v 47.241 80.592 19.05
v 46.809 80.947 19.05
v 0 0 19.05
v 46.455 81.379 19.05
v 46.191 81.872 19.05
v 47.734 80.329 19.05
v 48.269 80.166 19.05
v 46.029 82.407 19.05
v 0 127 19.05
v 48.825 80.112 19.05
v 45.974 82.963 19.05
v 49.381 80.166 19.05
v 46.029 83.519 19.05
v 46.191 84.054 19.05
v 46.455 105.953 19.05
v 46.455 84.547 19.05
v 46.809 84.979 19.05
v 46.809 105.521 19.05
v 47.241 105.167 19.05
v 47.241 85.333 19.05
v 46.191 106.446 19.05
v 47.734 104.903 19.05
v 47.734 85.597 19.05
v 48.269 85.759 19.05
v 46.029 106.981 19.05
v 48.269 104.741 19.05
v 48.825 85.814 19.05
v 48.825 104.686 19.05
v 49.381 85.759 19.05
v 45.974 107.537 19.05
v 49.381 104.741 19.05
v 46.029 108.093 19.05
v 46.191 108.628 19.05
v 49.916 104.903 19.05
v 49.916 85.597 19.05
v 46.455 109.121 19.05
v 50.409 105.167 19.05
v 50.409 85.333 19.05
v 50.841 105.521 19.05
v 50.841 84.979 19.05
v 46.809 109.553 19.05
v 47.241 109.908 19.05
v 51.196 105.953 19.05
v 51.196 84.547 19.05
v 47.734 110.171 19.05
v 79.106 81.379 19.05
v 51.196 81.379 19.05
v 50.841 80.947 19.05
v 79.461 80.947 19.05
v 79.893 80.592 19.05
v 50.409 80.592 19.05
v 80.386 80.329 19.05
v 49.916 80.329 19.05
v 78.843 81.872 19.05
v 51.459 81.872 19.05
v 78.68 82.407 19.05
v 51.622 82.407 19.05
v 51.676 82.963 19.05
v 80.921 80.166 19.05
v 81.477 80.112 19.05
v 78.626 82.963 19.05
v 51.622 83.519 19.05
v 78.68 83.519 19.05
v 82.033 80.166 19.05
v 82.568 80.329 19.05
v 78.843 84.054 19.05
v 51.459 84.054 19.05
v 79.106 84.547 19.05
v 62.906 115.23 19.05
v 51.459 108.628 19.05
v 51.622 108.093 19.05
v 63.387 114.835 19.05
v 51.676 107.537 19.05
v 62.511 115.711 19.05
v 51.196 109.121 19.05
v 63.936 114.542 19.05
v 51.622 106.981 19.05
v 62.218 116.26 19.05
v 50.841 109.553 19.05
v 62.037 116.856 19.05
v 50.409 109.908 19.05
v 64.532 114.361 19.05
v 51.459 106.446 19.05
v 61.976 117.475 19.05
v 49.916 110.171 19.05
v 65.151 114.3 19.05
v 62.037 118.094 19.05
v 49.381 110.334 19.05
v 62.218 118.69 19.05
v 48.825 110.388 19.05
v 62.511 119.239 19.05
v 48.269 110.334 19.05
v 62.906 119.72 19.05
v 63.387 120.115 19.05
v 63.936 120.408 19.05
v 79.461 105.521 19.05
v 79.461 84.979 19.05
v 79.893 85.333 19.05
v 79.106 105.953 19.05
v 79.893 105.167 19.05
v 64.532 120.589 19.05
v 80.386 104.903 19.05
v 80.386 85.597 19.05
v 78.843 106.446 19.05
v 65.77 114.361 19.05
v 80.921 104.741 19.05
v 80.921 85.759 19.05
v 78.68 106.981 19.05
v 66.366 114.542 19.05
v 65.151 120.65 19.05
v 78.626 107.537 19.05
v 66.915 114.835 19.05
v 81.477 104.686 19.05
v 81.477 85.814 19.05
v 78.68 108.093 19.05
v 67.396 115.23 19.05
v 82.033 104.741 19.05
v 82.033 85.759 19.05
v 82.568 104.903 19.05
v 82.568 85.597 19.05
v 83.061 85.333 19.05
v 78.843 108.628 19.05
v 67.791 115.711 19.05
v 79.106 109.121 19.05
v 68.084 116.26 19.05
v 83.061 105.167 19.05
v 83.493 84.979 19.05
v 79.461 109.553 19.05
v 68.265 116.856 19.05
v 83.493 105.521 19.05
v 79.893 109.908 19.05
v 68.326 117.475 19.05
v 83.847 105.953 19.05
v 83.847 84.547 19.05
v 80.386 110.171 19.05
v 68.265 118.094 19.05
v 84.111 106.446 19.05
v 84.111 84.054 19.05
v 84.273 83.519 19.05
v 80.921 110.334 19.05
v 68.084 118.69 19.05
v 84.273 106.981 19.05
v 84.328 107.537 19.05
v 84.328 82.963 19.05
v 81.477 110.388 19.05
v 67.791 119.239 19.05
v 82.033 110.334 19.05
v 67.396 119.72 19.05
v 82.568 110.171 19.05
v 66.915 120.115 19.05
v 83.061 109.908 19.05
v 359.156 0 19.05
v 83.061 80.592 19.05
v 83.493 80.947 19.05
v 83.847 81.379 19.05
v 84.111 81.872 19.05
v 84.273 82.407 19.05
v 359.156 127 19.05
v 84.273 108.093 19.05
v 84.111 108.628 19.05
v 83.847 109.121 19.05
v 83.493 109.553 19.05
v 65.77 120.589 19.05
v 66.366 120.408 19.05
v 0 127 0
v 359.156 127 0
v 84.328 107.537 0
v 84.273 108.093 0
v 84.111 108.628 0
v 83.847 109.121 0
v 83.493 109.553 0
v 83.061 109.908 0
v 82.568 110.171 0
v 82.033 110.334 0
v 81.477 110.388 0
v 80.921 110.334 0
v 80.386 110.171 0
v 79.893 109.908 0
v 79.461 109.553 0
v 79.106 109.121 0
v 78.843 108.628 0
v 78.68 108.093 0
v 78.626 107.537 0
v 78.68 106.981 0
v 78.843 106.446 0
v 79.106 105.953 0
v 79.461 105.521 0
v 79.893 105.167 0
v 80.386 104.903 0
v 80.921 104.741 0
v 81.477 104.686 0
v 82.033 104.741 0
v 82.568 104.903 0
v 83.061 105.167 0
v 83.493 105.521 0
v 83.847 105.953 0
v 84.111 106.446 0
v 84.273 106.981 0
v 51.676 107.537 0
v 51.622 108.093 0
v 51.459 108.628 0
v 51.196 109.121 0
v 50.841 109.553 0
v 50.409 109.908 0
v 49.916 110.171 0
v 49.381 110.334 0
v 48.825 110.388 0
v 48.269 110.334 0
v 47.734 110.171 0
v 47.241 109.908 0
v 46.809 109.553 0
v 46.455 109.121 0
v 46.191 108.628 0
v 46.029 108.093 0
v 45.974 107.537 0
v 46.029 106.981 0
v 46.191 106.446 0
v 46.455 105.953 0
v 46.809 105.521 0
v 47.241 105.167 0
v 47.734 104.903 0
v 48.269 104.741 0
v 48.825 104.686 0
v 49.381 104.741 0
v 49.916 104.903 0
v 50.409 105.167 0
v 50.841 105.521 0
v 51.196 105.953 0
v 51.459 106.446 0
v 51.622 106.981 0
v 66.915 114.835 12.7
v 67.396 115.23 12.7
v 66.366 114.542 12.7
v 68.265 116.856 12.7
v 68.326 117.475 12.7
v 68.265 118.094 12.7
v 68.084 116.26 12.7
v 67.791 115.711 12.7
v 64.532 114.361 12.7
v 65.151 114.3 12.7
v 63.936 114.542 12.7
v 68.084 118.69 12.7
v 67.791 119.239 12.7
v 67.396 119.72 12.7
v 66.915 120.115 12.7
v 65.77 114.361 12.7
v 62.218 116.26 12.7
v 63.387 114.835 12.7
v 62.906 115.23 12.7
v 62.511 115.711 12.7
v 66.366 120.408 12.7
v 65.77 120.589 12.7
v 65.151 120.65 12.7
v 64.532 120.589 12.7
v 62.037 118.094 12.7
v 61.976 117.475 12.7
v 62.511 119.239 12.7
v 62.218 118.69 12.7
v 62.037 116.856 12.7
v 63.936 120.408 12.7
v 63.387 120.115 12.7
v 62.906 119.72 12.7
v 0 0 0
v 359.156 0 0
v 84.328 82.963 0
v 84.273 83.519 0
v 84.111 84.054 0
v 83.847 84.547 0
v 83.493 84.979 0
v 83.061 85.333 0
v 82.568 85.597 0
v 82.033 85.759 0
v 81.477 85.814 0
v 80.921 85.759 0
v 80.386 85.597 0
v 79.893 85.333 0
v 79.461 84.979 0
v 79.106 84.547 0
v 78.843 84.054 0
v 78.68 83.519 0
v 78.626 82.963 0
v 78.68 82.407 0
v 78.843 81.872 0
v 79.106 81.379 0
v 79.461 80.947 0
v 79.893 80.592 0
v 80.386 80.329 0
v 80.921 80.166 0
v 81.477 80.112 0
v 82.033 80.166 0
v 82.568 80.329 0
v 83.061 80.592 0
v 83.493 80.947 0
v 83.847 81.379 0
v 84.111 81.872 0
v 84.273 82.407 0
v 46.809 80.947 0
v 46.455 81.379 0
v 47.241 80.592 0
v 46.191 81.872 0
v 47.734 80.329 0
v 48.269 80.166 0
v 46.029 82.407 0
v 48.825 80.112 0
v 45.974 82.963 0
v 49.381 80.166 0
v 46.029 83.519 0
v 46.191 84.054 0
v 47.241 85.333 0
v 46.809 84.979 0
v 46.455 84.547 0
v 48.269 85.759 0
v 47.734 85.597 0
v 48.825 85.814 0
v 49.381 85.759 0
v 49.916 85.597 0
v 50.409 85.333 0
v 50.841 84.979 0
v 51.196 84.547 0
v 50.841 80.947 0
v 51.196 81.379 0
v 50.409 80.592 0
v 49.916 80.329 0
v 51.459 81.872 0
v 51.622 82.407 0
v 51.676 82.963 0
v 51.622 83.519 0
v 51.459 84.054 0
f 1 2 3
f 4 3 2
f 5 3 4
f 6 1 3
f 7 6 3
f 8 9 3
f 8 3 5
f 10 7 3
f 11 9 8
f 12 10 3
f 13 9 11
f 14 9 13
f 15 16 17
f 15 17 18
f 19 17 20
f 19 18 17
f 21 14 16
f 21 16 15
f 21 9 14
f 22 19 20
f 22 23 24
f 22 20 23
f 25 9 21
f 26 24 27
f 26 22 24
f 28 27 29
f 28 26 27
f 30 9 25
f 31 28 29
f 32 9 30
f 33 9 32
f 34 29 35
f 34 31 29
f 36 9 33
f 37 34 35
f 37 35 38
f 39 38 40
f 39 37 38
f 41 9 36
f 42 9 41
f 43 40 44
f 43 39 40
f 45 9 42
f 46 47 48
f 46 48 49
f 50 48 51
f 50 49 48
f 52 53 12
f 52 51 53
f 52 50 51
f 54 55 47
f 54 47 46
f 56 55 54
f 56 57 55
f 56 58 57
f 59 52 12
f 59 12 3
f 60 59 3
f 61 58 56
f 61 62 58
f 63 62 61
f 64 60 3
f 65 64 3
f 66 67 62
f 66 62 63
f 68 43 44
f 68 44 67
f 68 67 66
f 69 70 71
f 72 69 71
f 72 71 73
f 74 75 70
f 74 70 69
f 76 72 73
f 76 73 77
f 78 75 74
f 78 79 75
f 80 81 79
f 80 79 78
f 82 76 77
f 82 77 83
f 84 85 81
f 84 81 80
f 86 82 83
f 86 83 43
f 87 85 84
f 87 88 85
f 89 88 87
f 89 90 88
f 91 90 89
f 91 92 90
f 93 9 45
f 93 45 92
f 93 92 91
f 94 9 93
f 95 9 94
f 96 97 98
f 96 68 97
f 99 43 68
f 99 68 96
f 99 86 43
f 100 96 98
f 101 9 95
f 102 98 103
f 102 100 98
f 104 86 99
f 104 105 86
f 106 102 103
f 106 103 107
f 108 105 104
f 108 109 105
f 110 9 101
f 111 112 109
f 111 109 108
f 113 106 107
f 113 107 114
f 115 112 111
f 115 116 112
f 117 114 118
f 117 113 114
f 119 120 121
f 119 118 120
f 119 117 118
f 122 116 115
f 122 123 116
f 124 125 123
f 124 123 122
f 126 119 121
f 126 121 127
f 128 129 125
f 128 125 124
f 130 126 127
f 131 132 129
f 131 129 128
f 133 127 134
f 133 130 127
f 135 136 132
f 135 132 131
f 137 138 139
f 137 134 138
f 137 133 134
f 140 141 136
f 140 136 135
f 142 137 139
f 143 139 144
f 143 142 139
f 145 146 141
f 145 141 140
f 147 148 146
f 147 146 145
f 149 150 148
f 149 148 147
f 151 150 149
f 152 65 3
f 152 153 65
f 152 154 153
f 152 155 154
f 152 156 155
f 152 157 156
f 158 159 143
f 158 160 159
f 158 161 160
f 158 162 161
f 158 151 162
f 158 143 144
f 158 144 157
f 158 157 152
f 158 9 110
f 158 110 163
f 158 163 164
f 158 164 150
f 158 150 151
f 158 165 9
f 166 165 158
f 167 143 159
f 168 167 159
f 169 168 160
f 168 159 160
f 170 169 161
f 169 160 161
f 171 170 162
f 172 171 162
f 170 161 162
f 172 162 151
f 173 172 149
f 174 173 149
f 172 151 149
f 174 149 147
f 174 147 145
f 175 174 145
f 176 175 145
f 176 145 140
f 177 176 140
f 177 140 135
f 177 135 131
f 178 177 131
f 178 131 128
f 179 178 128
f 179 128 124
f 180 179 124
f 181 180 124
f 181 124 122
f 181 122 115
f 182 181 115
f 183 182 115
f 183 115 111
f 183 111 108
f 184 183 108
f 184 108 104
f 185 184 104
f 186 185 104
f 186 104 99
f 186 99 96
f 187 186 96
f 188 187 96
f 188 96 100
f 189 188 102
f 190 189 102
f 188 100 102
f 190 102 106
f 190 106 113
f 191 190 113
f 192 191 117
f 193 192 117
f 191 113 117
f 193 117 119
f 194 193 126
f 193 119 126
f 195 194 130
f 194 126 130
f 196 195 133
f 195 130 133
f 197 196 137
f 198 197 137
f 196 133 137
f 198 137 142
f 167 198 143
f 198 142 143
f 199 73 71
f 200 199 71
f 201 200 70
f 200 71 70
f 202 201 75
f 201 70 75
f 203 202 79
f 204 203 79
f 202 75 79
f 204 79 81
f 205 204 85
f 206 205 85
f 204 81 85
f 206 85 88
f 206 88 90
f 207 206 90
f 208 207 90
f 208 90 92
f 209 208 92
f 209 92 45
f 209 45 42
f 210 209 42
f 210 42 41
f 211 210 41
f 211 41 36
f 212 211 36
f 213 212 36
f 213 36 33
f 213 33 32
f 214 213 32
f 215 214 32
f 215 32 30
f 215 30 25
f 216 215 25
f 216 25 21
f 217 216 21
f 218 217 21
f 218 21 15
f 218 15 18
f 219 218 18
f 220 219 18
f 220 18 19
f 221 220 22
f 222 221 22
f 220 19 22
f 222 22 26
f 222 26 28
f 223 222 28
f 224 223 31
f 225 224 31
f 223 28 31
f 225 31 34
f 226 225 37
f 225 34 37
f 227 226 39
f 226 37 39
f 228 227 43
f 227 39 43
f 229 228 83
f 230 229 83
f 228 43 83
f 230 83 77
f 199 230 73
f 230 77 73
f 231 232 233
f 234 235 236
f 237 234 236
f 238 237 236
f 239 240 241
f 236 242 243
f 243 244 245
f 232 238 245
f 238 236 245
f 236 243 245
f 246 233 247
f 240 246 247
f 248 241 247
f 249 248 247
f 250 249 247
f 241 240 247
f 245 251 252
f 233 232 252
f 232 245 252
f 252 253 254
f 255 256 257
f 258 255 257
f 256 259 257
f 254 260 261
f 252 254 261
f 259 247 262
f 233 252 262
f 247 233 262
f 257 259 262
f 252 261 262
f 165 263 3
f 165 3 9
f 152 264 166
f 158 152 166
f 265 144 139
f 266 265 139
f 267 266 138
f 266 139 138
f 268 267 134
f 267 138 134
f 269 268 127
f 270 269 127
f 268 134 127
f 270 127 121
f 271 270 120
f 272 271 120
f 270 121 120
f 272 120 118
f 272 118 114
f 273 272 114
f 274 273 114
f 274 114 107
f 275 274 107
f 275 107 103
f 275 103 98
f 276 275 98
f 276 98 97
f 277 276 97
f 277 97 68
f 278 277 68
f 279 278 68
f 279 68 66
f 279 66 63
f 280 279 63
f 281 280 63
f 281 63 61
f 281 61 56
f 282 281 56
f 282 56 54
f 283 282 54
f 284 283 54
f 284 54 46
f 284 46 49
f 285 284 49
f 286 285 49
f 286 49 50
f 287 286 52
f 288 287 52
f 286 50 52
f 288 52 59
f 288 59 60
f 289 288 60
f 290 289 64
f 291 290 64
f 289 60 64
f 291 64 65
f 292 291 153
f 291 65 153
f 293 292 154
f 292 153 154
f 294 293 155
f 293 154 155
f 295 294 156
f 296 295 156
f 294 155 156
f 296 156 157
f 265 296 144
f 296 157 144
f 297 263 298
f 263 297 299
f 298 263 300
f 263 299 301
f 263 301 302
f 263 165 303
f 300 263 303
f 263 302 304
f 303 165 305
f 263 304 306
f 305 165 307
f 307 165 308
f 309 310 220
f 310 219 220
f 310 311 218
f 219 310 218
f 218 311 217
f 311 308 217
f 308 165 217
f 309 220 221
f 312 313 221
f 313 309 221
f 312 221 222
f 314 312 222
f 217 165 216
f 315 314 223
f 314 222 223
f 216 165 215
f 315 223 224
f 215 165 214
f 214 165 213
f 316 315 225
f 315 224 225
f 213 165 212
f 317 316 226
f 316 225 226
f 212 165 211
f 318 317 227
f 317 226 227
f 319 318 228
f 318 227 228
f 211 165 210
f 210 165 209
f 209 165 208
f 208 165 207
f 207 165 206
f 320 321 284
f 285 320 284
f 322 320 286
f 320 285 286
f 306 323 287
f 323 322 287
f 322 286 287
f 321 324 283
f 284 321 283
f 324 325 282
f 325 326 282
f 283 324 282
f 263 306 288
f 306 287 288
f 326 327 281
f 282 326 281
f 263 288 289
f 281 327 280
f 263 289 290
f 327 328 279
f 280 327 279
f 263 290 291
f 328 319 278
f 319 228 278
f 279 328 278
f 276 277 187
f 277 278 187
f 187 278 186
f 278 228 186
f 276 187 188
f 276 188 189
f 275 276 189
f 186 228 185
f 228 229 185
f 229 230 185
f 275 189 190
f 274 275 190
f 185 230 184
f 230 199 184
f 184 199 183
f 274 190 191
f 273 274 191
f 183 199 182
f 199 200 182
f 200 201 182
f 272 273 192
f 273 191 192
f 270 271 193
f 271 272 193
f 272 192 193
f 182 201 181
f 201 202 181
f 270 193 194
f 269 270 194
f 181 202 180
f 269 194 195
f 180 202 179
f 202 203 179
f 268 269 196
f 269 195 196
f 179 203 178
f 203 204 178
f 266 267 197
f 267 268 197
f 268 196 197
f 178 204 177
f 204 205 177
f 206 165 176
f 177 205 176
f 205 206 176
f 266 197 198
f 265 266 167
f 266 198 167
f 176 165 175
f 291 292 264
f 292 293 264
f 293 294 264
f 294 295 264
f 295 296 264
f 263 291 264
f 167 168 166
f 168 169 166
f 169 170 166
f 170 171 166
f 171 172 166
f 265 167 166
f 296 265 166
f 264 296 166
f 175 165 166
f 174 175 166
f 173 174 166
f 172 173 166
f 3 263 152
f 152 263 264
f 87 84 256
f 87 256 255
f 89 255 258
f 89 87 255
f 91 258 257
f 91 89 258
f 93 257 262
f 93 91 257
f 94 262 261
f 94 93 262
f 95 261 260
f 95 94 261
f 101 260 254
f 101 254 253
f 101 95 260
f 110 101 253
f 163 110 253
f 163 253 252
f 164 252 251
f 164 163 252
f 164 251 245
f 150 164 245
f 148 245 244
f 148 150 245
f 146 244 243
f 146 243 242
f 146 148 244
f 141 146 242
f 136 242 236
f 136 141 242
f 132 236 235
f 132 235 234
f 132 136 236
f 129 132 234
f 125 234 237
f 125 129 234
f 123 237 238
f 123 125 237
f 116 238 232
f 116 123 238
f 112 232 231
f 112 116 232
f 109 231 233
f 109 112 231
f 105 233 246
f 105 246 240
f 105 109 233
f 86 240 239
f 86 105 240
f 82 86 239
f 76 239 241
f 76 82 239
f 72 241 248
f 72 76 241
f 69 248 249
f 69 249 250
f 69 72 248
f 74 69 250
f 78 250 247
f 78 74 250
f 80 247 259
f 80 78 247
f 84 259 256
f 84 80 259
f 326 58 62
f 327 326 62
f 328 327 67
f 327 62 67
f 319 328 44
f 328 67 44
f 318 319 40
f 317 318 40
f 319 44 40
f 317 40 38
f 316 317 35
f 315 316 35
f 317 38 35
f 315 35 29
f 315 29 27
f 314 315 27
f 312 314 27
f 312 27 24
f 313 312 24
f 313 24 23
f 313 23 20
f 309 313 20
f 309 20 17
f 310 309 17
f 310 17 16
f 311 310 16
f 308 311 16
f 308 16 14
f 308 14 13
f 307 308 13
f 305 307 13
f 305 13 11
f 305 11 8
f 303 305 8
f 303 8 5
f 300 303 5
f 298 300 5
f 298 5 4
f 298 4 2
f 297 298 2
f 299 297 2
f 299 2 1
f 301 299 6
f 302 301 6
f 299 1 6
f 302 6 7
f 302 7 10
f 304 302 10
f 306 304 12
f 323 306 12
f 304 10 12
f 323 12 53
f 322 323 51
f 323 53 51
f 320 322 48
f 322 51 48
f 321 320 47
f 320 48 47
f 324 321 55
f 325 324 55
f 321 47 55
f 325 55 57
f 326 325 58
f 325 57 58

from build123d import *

# Parameters (mm, degrees)
SKETCH1_W           = 359.156
SKETCH1_H           = 127
BOSS_EXTRUDE1_DEPTH = 19.05
CUT_EXTRUDE1_REACH  = 21.05
SKETCH2_R           = 2.85115
CUT_EXTRUDE2_START  = -19.05
SKETCH3_R           = 3.175
CUT_EXTRUDE2_DEPTH  = 6.35


with BuildPart() as part:
    # Sketch1 → Boss-Extrude1 (new body)
    with BuildSketch(Plane.XY):
        with Locations((179.578, 63.5)):
            Rectangle(SKETCH1_W, SKETCH1_H)
    extrude(amount=BOSS_EXTRUDE1_DEPTH)

    # Sketch2 → Cut-Extrude1 (cut, up to next)
    with BuildSketch(Plane.XY.offset(19.05), mode=Mode.PRIVATE) as cut_extrude1_sk1:
        with Locations((48.82515, 82.96275)):
            Circle(SKETCH2_R)
    cut_extrude1_tool1 = extrude(cut_extrude1_sk1.sketch, amount=-CUT_EXTRUDE1_REACH, mode=Mode.PRIVATE) & part.part
    add(cut_extrude1_tool1.solids().sort_by_distance((48.82515, 82.96275, 19.05))[0], mode=Mode.SUBTRACT)
    # Sketch2 → Cut-Extrude1 (cut, up to next)
    with BuildSketch(Plane.XY.offset(19.05), mode=Mode.PRIVATE) as cut_extrude1_sk2:
        with Locations((48.82515, 107.53725)):
            Circle(SKETCH2_R)
    cut_extrude1_tool2 = extrude(cut_extrude1_sk2.sketch, amount=-CUT_EXTRUDE1_REACH, mode=Mode.PRIVATE) & part.part
    add(cut_extrude1_tool2.solids().sort_by_distance((48.82515, 107.53725, 19.05))[0], mode=Mode.SUBTRACT)
    # Sketch2 → Cut-Extrude1 (cut, up to next)
    with BuildSketch(Plane.XY.offset(19.05), mode=Mode.PRIVATE) as cut_extrude1_sk3:
        with Locations((81.47685, 107.53725)):
            Circle(SKETCH2_R)
    cut_extrude1_tool3 = extrude(cut_extrude1_sk3.sketch, amount=-CUT_EXTRUDE1_REACH, mode=Mode.PRIVATE) & part.part
    add(cut_extrude1_tool3.solids().sort_by_distance((81.47685, 107.53725, 19.05))[0], mode=Mode.SUBTRACT)
    # Sketch2 → Cut-Extrude1 (cut, up to next)
    with BuildSketch(Plane.XY.offset(19.05), mode=Mode.PRIVATE) as cut_extrude1_sk4:
        with Locations((81.47685, 82.96275)):
            Circle(SKETCH2_R)
    cut_extrude1_tool4 = extrude(cut_extrude1_sk4.sketch, amount=-CUT_EXTRUDE1_REACH, mode=Mode.PRIVATE) & part.part
    add(cut_extrude1_tool4.solids().sort_by_distance((81.47685, 82.96275, 19.05))[0], mode=Mode.SUBTRACT)

    # Sketch3 → Cut-Extrude2 (cut)
    with BuildSketch(Plane(origin=(0, 0, 0), x_dir=(-1, 0, 0), z_dir=(0, 0, -1)).offset(CUT_EXTRUDE2_START)):
        with Locations((-65.151, 117.475)):
            Circle(SKETCH3_R)
    extrude(amount=CUT_EXTRUDE2_DEPTH, mode=Mode.SUBTRACT)


solid = part.part
